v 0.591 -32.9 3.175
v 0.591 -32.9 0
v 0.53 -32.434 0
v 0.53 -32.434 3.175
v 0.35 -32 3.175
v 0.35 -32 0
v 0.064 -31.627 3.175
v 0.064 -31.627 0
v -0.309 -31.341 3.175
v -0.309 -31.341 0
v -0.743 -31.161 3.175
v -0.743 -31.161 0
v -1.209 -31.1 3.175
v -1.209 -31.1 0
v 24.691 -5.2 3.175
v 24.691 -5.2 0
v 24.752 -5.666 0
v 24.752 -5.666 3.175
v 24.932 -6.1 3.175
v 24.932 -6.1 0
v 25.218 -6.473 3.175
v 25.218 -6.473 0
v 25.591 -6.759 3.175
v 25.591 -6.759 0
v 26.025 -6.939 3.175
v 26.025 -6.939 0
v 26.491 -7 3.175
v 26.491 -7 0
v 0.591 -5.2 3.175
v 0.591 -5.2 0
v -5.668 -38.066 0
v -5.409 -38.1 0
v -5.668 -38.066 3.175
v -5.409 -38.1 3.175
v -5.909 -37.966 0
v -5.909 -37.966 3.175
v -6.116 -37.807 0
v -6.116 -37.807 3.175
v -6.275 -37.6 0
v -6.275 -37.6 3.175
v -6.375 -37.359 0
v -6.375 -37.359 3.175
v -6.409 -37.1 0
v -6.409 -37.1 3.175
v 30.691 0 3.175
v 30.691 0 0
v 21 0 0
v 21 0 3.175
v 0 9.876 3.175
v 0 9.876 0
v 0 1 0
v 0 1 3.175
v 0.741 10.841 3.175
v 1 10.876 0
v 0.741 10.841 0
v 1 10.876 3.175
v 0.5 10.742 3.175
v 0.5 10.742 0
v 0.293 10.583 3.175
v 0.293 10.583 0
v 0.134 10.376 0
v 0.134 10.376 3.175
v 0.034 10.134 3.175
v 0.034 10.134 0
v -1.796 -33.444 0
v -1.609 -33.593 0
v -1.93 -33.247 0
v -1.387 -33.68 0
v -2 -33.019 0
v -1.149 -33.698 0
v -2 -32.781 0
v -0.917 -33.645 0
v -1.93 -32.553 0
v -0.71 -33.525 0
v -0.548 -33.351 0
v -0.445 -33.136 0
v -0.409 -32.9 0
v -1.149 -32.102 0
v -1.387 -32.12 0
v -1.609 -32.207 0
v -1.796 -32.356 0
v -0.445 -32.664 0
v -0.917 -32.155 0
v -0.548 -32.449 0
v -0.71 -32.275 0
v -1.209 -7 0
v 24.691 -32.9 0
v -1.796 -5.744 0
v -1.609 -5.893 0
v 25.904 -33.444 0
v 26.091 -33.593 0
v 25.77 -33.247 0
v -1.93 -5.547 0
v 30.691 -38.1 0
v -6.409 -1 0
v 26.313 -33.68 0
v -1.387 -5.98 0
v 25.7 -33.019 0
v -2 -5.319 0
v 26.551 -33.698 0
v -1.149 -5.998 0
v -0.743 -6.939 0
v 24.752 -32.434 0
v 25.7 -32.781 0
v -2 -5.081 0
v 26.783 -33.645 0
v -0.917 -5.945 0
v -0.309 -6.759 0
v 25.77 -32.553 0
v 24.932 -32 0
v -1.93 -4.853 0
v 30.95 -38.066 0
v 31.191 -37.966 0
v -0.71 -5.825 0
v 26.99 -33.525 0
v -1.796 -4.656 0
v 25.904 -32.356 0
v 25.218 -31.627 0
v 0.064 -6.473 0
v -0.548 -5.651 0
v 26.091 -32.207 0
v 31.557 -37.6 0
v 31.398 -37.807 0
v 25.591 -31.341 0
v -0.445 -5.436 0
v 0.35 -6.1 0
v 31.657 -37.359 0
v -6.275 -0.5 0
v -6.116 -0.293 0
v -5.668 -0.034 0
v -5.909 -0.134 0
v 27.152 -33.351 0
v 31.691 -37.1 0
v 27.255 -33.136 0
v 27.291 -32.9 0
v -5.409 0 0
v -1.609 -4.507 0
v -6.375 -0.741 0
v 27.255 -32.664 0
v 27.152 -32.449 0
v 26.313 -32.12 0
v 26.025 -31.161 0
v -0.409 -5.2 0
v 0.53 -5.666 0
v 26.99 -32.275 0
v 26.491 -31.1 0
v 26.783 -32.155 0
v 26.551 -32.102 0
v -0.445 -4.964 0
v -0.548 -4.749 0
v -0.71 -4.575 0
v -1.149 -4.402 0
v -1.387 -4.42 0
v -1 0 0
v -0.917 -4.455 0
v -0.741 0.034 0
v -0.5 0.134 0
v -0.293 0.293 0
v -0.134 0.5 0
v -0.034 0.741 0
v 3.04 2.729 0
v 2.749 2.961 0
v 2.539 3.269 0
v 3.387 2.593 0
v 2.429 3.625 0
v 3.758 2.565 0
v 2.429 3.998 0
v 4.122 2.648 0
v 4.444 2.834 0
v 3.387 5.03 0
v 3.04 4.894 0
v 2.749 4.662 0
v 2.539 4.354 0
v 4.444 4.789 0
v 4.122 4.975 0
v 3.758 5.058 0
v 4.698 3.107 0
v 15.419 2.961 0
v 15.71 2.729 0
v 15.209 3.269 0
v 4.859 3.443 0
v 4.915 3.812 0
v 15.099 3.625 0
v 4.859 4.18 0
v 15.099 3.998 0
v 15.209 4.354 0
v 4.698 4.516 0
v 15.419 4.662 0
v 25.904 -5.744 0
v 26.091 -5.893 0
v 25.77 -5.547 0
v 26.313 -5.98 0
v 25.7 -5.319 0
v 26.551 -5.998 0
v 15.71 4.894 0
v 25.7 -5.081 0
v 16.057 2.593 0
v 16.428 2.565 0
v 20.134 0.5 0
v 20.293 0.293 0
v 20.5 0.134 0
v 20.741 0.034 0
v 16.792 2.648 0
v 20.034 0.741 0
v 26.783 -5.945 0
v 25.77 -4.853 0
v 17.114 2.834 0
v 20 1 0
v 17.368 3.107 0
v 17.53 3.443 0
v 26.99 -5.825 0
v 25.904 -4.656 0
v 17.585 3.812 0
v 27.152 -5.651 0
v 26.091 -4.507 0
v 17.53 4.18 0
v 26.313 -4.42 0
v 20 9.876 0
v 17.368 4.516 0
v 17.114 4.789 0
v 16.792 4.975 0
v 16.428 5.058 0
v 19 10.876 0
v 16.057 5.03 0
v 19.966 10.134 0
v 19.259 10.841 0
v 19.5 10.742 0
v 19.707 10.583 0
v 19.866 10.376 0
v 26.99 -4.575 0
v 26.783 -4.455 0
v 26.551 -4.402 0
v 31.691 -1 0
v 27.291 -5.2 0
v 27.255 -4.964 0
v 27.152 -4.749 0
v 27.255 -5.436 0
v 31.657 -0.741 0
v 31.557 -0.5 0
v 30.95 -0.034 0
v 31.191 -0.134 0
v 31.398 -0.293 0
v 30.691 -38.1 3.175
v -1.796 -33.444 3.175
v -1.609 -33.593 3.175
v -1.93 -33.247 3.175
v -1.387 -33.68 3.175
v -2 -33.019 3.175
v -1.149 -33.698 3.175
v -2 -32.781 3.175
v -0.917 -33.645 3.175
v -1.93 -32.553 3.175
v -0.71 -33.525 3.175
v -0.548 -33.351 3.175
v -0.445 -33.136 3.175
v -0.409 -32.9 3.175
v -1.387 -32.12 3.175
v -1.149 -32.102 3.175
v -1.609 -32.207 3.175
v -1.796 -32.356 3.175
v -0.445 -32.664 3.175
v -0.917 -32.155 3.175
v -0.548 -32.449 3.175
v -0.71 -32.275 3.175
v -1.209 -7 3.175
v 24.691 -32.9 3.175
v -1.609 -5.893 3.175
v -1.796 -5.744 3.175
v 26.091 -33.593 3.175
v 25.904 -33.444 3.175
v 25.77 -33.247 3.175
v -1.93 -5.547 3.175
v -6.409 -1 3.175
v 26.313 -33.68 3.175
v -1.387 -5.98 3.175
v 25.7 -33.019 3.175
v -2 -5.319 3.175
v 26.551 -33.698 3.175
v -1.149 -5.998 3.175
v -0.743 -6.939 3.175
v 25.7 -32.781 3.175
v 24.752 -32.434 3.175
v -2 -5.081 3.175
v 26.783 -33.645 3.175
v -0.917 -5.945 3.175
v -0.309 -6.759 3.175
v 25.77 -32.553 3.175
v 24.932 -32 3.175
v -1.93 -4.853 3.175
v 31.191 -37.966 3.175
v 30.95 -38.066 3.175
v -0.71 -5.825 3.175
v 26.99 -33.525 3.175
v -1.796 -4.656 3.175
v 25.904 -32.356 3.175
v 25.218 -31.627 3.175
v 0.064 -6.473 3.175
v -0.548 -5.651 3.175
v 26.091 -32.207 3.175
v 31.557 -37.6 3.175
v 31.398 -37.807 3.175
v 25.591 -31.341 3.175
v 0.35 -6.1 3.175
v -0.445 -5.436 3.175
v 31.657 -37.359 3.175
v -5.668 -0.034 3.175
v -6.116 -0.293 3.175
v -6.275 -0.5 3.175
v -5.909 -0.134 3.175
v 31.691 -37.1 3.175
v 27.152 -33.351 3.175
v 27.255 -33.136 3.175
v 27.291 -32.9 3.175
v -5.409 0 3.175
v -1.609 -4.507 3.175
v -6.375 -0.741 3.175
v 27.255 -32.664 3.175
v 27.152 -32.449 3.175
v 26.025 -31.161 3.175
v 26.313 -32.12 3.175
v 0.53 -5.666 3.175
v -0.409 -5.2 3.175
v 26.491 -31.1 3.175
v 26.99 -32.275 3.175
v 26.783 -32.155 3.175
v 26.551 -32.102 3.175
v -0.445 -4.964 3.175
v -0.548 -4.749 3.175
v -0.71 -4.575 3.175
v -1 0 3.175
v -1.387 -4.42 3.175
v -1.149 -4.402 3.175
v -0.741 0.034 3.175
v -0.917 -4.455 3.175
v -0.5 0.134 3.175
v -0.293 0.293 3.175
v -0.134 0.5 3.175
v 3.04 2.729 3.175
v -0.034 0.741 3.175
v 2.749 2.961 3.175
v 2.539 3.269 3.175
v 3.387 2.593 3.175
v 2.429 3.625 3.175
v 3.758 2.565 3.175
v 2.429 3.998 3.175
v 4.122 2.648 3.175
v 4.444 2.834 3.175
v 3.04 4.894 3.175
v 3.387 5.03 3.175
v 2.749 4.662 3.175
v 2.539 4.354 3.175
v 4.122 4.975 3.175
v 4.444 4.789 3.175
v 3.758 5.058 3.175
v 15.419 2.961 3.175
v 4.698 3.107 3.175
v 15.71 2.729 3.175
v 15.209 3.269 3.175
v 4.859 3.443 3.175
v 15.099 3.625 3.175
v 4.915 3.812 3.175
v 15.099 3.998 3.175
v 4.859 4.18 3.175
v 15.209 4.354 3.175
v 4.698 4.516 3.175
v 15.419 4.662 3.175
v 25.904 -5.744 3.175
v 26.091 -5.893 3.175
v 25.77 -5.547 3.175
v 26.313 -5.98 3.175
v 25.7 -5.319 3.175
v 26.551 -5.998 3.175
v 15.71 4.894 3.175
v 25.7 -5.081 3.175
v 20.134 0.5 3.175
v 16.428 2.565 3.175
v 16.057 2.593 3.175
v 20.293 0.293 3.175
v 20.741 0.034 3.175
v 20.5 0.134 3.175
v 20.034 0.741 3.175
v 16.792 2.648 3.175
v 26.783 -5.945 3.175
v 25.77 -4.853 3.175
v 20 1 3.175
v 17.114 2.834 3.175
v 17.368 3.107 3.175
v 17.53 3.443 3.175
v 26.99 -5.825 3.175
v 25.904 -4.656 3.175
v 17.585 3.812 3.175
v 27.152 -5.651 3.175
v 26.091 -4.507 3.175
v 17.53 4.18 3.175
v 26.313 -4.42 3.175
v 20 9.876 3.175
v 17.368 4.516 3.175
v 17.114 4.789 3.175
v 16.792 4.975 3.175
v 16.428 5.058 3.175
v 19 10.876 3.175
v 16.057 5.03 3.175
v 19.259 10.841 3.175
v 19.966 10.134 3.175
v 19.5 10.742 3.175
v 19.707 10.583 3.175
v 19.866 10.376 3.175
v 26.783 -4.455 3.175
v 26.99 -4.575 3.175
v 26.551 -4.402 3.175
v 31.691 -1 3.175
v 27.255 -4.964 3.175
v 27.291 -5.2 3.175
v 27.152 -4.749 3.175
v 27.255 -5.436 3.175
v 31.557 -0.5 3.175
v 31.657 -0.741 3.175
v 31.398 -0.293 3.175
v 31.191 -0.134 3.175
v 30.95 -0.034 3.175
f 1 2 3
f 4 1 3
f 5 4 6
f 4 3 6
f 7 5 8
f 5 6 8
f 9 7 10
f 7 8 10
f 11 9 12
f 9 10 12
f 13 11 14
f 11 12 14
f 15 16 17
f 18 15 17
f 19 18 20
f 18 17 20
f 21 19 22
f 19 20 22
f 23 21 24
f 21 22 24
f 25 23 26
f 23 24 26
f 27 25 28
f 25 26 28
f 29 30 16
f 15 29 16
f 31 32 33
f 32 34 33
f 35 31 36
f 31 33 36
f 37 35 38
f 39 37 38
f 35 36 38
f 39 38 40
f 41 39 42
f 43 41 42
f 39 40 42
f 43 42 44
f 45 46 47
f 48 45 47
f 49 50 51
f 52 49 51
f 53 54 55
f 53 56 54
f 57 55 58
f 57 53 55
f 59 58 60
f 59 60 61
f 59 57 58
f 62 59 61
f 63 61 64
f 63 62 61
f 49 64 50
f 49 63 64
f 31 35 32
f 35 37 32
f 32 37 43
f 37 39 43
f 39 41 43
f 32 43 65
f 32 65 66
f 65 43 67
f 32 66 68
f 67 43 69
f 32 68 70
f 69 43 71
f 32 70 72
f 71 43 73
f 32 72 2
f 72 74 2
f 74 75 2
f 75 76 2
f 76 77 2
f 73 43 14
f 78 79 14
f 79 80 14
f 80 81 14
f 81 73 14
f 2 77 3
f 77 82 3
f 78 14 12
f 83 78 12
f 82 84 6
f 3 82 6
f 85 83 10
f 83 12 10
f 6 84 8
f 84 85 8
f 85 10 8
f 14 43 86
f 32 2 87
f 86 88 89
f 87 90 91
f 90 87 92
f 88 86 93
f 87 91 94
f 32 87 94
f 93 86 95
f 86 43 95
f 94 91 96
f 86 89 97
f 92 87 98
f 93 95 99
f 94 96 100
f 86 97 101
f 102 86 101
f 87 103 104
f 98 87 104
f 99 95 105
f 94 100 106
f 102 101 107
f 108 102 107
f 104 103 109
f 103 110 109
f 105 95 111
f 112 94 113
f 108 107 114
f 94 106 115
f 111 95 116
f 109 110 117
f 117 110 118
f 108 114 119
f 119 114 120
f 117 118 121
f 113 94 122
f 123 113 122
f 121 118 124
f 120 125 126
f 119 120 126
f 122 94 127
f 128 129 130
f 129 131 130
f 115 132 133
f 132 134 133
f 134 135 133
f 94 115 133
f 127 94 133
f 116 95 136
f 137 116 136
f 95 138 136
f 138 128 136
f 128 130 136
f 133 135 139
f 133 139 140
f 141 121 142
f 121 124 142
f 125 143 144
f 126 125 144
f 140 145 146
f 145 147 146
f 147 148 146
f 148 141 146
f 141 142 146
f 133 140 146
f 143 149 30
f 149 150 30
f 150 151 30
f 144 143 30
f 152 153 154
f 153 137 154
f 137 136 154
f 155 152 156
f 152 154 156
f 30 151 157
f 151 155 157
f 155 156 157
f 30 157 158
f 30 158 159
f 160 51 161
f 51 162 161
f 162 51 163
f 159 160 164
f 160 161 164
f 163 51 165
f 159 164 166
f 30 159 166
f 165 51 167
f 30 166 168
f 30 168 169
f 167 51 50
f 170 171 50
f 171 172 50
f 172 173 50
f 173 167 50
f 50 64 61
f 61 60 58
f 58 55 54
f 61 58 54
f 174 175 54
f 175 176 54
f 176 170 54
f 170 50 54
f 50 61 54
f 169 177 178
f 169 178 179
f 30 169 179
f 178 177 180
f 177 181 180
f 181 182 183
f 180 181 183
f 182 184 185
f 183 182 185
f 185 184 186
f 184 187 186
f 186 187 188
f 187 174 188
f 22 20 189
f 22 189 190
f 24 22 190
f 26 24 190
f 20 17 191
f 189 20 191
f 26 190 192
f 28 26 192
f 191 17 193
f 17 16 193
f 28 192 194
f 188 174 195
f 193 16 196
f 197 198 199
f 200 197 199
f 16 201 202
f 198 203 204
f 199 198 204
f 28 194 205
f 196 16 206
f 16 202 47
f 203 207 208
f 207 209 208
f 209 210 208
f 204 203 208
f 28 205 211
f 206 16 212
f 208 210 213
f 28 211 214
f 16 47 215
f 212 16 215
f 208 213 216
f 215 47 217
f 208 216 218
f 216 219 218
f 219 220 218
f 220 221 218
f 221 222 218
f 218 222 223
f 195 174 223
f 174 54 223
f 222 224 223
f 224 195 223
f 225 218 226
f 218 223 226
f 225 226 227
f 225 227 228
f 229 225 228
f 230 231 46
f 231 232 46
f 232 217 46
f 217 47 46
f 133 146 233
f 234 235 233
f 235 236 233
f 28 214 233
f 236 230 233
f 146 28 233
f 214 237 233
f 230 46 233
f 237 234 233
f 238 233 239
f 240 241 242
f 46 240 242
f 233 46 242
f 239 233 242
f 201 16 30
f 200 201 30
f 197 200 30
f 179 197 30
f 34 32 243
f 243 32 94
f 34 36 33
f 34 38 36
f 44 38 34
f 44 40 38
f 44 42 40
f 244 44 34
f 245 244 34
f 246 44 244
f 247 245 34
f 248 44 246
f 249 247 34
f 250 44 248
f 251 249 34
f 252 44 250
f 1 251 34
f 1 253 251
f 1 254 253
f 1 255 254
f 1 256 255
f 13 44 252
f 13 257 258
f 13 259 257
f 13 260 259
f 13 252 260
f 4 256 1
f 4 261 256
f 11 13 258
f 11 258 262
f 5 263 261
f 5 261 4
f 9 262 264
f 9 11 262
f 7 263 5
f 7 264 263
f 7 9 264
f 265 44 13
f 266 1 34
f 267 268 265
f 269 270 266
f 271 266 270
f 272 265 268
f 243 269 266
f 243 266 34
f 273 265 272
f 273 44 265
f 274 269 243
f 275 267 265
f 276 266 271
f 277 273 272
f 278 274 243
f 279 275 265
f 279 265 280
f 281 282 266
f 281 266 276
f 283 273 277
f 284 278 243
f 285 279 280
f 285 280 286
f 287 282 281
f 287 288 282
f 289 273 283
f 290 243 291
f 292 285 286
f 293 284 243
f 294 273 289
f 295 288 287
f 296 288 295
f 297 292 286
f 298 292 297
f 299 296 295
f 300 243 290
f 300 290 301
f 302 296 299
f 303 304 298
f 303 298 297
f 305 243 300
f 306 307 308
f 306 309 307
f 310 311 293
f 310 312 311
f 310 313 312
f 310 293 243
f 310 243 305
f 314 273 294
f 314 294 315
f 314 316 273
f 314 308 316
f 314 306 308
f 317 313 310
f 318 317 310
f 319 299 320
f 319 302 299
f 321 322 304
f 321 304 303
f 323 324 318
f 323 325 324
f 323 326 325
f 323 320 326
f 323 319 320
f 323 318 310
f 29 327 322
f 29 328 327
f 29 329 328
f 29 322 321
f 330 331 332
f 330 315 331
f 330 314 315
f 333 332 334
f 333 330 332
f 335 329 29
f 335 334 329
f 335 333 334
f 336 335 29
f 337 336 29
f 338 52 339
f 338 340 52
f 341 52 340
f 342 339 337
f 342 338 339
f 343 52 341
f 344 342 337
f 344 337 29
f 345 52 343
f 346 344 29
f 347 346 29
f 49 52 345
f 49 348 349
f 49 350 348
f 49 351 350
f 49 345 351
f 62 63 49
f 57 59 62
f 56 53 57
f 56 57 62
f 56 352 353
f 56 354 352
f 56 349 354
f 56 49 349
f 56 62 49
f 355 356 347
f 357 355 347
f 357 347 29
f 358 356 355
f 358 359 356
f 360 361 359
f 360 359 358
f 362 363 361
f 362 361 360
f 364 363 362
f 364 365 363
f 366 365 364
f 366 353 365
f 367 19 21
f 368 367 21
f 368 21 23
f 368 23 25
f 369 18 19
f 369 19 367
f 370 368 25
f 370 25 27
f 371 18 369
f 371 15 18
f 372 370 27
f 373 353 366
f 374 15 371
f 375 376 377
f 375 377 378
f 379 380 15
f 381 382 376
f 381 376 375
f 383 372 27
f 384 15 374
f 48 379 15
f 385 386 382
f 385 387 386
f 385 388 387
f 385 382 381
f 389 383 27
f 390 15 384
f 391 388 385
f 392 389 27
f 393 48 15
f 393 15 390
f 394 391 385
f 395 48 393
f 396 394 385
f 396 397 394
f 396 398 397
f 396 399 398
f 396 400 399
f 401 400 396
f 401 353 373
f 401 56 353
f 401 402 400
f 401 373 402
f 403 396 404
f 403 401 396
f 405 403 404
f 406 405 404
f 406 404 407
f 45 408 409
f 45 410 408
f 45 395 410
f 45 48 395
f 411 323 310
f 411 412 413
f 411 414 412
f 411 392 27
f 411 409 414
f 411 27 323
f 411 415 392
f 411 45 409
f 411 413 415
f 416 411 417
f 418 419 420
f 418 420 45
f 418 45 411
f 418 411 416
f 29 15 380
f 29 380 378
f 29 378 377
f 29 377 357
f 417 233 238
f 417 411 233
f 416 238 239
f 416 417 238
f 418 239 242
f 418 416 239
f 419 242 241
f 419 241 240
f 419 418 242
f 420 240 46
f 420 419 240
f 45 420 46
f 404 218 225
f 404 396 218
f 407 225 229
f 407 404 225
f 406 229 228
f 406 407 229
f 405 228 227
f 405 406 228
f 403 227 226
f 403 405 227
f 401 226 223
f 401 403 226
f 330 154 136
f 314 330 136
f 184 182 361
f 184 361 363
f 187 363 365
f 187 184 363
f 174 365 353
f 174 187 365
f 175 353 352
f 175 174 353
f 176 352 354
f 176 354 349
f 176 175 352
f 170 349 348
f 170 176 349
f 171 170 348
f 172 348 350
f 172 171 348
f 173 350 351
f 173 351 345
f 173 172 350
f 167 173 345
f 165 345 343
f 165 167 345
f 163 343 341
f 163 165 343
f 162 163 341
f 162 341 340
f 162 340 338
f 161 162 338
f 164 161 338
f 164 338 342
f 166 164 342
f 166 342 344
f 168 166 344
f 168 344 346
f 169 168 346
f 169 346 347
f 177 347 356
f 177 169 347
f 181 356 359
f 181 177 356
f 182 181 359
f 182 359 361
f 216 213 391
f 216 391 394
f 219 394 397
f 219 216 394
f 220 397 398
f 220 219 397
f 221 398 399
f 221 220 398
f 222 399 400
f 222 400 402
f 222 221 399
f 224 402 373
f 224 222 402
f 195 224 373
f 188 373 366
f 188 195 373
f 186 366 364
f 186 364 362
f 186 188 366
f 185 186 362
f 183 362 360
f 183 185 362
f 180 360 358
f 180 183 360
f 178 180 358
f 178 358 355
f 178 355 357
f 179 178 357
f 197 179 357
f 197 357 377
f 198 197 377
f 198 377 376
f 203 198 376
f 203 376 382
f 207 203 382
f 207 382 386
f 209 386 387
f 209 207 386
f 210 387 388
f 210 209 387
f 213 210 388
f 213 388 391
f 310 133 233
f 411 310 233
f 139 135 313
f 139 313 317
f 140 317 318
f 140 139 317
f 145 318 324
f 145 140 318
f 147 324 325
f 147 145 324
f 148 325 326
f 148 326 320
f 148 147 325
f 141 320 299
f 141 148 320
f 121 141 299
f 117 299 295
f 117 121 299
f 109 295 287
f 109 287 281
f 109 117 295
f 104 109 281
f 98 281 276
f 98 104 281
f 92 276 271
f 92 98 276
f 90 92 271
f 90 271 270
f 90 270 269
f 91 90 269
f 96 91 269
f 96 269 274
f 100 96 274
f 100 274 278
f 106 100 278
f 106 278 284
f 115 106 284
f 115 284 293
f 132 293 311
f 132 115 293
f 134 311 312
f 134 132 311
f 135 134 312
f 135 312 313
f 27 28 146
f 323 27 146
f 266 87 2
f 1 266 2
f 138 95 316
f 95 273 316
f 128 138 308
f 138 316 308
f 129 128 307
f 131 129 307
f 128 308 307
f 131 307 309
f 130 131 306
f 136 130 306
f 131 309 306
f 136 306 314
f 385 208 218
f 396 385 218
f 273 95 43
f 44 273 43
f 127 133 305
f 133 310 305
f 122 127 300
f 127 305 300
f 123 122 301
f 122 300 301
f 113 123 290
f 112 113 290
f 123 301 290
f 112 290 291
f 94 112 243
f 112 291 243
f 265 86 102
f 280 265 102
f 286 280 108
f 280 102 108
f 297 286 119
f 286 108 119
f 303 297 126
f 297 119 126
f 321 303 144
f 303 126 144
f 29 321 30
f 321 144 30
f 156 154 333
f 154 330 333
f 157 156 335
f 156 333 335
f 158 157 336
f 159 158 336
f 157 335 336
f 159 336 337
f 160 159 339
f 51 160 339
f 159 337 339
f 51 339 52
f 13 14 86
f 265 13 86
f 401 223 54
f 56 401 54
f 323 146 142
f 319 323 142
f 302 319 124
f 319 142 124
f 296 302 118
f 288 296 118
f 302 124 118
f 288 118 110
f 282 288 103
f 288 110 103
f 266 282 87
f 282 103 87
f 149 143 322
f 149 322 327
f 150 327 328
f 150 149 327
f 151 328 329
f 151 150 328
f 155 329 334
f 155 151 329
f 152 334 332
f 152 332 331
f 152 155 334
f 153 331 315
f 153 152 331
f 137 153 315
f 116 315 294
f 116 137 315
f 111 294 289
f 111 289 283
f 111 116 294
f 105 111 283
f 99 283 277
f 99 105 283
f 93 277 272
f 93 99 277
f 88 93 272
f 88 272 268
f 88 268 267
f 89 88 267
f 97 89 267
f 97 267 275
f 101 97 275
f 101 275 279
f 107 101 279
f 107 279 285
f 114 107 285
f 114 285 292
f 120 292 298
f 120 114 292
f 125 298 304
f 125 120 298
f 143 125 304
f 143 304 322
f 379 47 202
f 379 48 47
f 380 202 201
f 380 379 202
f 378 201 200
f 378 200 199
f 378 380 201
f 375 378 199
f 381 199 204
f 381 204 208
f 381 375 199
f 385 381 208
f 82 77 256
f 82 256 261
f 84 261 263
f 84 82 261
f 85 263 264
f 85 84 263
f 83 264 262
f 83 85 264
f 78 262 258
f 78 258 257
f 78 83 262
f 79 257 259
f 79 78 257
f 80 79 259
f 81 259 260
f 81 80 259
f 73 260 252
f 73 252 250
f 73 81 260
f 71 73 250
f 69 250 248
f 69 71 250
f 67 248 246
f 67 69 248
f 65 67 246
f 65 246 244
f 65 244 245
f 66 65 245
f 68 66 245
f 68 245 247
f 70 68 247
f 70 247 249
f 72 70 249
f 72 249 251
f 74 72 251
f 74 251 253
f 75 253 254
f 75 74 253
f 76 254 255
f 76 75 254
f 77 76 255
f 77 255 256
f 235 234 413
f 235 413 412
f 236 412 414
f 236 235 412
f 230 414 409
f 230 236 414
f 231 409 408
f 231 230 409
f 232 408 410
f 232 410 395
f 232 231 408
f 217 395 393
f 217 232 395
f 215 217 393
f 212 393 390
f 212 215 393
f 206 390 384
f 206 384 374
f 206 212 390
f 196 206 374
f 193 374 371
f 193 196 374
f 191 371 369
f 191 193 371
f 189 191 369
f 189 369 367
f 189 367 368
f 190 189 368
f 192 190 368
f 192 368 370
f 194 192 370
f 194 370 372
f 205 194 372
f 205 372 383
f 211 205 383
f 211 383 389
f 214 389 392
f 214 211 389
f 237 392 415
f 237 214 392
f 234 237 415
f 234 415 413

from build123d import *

# Parameters (mm, degrees)
SKETCH1_R           = 0.8
SKETCH1_R_2         = 1.25
BOSS_EXTRUDE1_DEPTH = 3.175
FILLET1_R           = 1


with BuildPart() as part:
    # Sketch1 → Boss-Extrude1 (new body)
    with BuildSketch(Plane.XY):
        Polygon((31.690894529, -38.1), (31.690894529, 0), (20, 0), (20, 10.87553853), (0, 10.87553853), (0, 0), (-6.409105471, 0), (-6.409105471, -38.1), align=None)
        with Locations((26.490894529, -32.9)):
            Circle(SKETCH1_R, mode=Mode.SUBTRACT)
        with Locations((-1.209105471, -32.9)):
            Circle(SKETCH1_R, mode=Mode.SUBTRACT)
        with Locations((-1.209105471, -5.2)):
            Circle(SKETCH1_R, mode=Mode.SUBTRACT)
        with Locations((26.490894529, -5.2)):
            Circle(SKETCH1_R, mode=Mode.SUBTRACT)
        with Locations((16.335044769, 3.811593223)):
            Circle(SKETCH1_R_2, mode=Mode.SUBTRACT)
        with Locations((3.664955231, 3.811593223)):
            Circle(SKETCH1_R_2, mode=Mode.SUBTRACT)
        with BuildLine():
            Line((26.490894529, -7), (26.490894529, -31.1))
            ThreePointArc((26.490894529, -31.1), (25.218102323, -31.627207794), (24.690894529, -32.9))
            Line((24.690894529, -32.9), (0.590894529, -32.9))
            ThreePointArc((0.590894529, -32.9), (0.063686735, -31.627207794), (-1.209105471, -31.1))
            Line((-1.209105471, -31.1), (-1.209105471, -7))
            ThreePointArc((-1.209105471, -7), (0.063686735, -6.472792206), (0.590894529, -5.2))
            Line((0.590894529, -5.2), (24.690894529, -5.2))
            ThreePointArc((24.690894529, -5.2), (25.218102323, -6.472792206), (26.490894529, -7))
        make_face(mode=Mode.SUBTRACT)
    extrude(amount=BOSS_EXTRUDE1_DEPTH)

    # Fillet1
    fillet1_edges = [part.edges().sort_by_distance(p)[0] for p in [
        (20, 10.87553853, 1.5875),
        (20, 0, 1.5875),
        (31.690894529, 0, 1.5875),
        (31.690894529, -38.1, 1.5875),
        (-6.409105471, -38.1, 1.5875),
        (-6.409105471, 0, 1.5875),
        (0, 0, 1.5875),
        (0, 10.87553853, 1.5875),
    ]]
    fillet(fillet1_edges, radius=FILLET1_R)


solid = part.part
